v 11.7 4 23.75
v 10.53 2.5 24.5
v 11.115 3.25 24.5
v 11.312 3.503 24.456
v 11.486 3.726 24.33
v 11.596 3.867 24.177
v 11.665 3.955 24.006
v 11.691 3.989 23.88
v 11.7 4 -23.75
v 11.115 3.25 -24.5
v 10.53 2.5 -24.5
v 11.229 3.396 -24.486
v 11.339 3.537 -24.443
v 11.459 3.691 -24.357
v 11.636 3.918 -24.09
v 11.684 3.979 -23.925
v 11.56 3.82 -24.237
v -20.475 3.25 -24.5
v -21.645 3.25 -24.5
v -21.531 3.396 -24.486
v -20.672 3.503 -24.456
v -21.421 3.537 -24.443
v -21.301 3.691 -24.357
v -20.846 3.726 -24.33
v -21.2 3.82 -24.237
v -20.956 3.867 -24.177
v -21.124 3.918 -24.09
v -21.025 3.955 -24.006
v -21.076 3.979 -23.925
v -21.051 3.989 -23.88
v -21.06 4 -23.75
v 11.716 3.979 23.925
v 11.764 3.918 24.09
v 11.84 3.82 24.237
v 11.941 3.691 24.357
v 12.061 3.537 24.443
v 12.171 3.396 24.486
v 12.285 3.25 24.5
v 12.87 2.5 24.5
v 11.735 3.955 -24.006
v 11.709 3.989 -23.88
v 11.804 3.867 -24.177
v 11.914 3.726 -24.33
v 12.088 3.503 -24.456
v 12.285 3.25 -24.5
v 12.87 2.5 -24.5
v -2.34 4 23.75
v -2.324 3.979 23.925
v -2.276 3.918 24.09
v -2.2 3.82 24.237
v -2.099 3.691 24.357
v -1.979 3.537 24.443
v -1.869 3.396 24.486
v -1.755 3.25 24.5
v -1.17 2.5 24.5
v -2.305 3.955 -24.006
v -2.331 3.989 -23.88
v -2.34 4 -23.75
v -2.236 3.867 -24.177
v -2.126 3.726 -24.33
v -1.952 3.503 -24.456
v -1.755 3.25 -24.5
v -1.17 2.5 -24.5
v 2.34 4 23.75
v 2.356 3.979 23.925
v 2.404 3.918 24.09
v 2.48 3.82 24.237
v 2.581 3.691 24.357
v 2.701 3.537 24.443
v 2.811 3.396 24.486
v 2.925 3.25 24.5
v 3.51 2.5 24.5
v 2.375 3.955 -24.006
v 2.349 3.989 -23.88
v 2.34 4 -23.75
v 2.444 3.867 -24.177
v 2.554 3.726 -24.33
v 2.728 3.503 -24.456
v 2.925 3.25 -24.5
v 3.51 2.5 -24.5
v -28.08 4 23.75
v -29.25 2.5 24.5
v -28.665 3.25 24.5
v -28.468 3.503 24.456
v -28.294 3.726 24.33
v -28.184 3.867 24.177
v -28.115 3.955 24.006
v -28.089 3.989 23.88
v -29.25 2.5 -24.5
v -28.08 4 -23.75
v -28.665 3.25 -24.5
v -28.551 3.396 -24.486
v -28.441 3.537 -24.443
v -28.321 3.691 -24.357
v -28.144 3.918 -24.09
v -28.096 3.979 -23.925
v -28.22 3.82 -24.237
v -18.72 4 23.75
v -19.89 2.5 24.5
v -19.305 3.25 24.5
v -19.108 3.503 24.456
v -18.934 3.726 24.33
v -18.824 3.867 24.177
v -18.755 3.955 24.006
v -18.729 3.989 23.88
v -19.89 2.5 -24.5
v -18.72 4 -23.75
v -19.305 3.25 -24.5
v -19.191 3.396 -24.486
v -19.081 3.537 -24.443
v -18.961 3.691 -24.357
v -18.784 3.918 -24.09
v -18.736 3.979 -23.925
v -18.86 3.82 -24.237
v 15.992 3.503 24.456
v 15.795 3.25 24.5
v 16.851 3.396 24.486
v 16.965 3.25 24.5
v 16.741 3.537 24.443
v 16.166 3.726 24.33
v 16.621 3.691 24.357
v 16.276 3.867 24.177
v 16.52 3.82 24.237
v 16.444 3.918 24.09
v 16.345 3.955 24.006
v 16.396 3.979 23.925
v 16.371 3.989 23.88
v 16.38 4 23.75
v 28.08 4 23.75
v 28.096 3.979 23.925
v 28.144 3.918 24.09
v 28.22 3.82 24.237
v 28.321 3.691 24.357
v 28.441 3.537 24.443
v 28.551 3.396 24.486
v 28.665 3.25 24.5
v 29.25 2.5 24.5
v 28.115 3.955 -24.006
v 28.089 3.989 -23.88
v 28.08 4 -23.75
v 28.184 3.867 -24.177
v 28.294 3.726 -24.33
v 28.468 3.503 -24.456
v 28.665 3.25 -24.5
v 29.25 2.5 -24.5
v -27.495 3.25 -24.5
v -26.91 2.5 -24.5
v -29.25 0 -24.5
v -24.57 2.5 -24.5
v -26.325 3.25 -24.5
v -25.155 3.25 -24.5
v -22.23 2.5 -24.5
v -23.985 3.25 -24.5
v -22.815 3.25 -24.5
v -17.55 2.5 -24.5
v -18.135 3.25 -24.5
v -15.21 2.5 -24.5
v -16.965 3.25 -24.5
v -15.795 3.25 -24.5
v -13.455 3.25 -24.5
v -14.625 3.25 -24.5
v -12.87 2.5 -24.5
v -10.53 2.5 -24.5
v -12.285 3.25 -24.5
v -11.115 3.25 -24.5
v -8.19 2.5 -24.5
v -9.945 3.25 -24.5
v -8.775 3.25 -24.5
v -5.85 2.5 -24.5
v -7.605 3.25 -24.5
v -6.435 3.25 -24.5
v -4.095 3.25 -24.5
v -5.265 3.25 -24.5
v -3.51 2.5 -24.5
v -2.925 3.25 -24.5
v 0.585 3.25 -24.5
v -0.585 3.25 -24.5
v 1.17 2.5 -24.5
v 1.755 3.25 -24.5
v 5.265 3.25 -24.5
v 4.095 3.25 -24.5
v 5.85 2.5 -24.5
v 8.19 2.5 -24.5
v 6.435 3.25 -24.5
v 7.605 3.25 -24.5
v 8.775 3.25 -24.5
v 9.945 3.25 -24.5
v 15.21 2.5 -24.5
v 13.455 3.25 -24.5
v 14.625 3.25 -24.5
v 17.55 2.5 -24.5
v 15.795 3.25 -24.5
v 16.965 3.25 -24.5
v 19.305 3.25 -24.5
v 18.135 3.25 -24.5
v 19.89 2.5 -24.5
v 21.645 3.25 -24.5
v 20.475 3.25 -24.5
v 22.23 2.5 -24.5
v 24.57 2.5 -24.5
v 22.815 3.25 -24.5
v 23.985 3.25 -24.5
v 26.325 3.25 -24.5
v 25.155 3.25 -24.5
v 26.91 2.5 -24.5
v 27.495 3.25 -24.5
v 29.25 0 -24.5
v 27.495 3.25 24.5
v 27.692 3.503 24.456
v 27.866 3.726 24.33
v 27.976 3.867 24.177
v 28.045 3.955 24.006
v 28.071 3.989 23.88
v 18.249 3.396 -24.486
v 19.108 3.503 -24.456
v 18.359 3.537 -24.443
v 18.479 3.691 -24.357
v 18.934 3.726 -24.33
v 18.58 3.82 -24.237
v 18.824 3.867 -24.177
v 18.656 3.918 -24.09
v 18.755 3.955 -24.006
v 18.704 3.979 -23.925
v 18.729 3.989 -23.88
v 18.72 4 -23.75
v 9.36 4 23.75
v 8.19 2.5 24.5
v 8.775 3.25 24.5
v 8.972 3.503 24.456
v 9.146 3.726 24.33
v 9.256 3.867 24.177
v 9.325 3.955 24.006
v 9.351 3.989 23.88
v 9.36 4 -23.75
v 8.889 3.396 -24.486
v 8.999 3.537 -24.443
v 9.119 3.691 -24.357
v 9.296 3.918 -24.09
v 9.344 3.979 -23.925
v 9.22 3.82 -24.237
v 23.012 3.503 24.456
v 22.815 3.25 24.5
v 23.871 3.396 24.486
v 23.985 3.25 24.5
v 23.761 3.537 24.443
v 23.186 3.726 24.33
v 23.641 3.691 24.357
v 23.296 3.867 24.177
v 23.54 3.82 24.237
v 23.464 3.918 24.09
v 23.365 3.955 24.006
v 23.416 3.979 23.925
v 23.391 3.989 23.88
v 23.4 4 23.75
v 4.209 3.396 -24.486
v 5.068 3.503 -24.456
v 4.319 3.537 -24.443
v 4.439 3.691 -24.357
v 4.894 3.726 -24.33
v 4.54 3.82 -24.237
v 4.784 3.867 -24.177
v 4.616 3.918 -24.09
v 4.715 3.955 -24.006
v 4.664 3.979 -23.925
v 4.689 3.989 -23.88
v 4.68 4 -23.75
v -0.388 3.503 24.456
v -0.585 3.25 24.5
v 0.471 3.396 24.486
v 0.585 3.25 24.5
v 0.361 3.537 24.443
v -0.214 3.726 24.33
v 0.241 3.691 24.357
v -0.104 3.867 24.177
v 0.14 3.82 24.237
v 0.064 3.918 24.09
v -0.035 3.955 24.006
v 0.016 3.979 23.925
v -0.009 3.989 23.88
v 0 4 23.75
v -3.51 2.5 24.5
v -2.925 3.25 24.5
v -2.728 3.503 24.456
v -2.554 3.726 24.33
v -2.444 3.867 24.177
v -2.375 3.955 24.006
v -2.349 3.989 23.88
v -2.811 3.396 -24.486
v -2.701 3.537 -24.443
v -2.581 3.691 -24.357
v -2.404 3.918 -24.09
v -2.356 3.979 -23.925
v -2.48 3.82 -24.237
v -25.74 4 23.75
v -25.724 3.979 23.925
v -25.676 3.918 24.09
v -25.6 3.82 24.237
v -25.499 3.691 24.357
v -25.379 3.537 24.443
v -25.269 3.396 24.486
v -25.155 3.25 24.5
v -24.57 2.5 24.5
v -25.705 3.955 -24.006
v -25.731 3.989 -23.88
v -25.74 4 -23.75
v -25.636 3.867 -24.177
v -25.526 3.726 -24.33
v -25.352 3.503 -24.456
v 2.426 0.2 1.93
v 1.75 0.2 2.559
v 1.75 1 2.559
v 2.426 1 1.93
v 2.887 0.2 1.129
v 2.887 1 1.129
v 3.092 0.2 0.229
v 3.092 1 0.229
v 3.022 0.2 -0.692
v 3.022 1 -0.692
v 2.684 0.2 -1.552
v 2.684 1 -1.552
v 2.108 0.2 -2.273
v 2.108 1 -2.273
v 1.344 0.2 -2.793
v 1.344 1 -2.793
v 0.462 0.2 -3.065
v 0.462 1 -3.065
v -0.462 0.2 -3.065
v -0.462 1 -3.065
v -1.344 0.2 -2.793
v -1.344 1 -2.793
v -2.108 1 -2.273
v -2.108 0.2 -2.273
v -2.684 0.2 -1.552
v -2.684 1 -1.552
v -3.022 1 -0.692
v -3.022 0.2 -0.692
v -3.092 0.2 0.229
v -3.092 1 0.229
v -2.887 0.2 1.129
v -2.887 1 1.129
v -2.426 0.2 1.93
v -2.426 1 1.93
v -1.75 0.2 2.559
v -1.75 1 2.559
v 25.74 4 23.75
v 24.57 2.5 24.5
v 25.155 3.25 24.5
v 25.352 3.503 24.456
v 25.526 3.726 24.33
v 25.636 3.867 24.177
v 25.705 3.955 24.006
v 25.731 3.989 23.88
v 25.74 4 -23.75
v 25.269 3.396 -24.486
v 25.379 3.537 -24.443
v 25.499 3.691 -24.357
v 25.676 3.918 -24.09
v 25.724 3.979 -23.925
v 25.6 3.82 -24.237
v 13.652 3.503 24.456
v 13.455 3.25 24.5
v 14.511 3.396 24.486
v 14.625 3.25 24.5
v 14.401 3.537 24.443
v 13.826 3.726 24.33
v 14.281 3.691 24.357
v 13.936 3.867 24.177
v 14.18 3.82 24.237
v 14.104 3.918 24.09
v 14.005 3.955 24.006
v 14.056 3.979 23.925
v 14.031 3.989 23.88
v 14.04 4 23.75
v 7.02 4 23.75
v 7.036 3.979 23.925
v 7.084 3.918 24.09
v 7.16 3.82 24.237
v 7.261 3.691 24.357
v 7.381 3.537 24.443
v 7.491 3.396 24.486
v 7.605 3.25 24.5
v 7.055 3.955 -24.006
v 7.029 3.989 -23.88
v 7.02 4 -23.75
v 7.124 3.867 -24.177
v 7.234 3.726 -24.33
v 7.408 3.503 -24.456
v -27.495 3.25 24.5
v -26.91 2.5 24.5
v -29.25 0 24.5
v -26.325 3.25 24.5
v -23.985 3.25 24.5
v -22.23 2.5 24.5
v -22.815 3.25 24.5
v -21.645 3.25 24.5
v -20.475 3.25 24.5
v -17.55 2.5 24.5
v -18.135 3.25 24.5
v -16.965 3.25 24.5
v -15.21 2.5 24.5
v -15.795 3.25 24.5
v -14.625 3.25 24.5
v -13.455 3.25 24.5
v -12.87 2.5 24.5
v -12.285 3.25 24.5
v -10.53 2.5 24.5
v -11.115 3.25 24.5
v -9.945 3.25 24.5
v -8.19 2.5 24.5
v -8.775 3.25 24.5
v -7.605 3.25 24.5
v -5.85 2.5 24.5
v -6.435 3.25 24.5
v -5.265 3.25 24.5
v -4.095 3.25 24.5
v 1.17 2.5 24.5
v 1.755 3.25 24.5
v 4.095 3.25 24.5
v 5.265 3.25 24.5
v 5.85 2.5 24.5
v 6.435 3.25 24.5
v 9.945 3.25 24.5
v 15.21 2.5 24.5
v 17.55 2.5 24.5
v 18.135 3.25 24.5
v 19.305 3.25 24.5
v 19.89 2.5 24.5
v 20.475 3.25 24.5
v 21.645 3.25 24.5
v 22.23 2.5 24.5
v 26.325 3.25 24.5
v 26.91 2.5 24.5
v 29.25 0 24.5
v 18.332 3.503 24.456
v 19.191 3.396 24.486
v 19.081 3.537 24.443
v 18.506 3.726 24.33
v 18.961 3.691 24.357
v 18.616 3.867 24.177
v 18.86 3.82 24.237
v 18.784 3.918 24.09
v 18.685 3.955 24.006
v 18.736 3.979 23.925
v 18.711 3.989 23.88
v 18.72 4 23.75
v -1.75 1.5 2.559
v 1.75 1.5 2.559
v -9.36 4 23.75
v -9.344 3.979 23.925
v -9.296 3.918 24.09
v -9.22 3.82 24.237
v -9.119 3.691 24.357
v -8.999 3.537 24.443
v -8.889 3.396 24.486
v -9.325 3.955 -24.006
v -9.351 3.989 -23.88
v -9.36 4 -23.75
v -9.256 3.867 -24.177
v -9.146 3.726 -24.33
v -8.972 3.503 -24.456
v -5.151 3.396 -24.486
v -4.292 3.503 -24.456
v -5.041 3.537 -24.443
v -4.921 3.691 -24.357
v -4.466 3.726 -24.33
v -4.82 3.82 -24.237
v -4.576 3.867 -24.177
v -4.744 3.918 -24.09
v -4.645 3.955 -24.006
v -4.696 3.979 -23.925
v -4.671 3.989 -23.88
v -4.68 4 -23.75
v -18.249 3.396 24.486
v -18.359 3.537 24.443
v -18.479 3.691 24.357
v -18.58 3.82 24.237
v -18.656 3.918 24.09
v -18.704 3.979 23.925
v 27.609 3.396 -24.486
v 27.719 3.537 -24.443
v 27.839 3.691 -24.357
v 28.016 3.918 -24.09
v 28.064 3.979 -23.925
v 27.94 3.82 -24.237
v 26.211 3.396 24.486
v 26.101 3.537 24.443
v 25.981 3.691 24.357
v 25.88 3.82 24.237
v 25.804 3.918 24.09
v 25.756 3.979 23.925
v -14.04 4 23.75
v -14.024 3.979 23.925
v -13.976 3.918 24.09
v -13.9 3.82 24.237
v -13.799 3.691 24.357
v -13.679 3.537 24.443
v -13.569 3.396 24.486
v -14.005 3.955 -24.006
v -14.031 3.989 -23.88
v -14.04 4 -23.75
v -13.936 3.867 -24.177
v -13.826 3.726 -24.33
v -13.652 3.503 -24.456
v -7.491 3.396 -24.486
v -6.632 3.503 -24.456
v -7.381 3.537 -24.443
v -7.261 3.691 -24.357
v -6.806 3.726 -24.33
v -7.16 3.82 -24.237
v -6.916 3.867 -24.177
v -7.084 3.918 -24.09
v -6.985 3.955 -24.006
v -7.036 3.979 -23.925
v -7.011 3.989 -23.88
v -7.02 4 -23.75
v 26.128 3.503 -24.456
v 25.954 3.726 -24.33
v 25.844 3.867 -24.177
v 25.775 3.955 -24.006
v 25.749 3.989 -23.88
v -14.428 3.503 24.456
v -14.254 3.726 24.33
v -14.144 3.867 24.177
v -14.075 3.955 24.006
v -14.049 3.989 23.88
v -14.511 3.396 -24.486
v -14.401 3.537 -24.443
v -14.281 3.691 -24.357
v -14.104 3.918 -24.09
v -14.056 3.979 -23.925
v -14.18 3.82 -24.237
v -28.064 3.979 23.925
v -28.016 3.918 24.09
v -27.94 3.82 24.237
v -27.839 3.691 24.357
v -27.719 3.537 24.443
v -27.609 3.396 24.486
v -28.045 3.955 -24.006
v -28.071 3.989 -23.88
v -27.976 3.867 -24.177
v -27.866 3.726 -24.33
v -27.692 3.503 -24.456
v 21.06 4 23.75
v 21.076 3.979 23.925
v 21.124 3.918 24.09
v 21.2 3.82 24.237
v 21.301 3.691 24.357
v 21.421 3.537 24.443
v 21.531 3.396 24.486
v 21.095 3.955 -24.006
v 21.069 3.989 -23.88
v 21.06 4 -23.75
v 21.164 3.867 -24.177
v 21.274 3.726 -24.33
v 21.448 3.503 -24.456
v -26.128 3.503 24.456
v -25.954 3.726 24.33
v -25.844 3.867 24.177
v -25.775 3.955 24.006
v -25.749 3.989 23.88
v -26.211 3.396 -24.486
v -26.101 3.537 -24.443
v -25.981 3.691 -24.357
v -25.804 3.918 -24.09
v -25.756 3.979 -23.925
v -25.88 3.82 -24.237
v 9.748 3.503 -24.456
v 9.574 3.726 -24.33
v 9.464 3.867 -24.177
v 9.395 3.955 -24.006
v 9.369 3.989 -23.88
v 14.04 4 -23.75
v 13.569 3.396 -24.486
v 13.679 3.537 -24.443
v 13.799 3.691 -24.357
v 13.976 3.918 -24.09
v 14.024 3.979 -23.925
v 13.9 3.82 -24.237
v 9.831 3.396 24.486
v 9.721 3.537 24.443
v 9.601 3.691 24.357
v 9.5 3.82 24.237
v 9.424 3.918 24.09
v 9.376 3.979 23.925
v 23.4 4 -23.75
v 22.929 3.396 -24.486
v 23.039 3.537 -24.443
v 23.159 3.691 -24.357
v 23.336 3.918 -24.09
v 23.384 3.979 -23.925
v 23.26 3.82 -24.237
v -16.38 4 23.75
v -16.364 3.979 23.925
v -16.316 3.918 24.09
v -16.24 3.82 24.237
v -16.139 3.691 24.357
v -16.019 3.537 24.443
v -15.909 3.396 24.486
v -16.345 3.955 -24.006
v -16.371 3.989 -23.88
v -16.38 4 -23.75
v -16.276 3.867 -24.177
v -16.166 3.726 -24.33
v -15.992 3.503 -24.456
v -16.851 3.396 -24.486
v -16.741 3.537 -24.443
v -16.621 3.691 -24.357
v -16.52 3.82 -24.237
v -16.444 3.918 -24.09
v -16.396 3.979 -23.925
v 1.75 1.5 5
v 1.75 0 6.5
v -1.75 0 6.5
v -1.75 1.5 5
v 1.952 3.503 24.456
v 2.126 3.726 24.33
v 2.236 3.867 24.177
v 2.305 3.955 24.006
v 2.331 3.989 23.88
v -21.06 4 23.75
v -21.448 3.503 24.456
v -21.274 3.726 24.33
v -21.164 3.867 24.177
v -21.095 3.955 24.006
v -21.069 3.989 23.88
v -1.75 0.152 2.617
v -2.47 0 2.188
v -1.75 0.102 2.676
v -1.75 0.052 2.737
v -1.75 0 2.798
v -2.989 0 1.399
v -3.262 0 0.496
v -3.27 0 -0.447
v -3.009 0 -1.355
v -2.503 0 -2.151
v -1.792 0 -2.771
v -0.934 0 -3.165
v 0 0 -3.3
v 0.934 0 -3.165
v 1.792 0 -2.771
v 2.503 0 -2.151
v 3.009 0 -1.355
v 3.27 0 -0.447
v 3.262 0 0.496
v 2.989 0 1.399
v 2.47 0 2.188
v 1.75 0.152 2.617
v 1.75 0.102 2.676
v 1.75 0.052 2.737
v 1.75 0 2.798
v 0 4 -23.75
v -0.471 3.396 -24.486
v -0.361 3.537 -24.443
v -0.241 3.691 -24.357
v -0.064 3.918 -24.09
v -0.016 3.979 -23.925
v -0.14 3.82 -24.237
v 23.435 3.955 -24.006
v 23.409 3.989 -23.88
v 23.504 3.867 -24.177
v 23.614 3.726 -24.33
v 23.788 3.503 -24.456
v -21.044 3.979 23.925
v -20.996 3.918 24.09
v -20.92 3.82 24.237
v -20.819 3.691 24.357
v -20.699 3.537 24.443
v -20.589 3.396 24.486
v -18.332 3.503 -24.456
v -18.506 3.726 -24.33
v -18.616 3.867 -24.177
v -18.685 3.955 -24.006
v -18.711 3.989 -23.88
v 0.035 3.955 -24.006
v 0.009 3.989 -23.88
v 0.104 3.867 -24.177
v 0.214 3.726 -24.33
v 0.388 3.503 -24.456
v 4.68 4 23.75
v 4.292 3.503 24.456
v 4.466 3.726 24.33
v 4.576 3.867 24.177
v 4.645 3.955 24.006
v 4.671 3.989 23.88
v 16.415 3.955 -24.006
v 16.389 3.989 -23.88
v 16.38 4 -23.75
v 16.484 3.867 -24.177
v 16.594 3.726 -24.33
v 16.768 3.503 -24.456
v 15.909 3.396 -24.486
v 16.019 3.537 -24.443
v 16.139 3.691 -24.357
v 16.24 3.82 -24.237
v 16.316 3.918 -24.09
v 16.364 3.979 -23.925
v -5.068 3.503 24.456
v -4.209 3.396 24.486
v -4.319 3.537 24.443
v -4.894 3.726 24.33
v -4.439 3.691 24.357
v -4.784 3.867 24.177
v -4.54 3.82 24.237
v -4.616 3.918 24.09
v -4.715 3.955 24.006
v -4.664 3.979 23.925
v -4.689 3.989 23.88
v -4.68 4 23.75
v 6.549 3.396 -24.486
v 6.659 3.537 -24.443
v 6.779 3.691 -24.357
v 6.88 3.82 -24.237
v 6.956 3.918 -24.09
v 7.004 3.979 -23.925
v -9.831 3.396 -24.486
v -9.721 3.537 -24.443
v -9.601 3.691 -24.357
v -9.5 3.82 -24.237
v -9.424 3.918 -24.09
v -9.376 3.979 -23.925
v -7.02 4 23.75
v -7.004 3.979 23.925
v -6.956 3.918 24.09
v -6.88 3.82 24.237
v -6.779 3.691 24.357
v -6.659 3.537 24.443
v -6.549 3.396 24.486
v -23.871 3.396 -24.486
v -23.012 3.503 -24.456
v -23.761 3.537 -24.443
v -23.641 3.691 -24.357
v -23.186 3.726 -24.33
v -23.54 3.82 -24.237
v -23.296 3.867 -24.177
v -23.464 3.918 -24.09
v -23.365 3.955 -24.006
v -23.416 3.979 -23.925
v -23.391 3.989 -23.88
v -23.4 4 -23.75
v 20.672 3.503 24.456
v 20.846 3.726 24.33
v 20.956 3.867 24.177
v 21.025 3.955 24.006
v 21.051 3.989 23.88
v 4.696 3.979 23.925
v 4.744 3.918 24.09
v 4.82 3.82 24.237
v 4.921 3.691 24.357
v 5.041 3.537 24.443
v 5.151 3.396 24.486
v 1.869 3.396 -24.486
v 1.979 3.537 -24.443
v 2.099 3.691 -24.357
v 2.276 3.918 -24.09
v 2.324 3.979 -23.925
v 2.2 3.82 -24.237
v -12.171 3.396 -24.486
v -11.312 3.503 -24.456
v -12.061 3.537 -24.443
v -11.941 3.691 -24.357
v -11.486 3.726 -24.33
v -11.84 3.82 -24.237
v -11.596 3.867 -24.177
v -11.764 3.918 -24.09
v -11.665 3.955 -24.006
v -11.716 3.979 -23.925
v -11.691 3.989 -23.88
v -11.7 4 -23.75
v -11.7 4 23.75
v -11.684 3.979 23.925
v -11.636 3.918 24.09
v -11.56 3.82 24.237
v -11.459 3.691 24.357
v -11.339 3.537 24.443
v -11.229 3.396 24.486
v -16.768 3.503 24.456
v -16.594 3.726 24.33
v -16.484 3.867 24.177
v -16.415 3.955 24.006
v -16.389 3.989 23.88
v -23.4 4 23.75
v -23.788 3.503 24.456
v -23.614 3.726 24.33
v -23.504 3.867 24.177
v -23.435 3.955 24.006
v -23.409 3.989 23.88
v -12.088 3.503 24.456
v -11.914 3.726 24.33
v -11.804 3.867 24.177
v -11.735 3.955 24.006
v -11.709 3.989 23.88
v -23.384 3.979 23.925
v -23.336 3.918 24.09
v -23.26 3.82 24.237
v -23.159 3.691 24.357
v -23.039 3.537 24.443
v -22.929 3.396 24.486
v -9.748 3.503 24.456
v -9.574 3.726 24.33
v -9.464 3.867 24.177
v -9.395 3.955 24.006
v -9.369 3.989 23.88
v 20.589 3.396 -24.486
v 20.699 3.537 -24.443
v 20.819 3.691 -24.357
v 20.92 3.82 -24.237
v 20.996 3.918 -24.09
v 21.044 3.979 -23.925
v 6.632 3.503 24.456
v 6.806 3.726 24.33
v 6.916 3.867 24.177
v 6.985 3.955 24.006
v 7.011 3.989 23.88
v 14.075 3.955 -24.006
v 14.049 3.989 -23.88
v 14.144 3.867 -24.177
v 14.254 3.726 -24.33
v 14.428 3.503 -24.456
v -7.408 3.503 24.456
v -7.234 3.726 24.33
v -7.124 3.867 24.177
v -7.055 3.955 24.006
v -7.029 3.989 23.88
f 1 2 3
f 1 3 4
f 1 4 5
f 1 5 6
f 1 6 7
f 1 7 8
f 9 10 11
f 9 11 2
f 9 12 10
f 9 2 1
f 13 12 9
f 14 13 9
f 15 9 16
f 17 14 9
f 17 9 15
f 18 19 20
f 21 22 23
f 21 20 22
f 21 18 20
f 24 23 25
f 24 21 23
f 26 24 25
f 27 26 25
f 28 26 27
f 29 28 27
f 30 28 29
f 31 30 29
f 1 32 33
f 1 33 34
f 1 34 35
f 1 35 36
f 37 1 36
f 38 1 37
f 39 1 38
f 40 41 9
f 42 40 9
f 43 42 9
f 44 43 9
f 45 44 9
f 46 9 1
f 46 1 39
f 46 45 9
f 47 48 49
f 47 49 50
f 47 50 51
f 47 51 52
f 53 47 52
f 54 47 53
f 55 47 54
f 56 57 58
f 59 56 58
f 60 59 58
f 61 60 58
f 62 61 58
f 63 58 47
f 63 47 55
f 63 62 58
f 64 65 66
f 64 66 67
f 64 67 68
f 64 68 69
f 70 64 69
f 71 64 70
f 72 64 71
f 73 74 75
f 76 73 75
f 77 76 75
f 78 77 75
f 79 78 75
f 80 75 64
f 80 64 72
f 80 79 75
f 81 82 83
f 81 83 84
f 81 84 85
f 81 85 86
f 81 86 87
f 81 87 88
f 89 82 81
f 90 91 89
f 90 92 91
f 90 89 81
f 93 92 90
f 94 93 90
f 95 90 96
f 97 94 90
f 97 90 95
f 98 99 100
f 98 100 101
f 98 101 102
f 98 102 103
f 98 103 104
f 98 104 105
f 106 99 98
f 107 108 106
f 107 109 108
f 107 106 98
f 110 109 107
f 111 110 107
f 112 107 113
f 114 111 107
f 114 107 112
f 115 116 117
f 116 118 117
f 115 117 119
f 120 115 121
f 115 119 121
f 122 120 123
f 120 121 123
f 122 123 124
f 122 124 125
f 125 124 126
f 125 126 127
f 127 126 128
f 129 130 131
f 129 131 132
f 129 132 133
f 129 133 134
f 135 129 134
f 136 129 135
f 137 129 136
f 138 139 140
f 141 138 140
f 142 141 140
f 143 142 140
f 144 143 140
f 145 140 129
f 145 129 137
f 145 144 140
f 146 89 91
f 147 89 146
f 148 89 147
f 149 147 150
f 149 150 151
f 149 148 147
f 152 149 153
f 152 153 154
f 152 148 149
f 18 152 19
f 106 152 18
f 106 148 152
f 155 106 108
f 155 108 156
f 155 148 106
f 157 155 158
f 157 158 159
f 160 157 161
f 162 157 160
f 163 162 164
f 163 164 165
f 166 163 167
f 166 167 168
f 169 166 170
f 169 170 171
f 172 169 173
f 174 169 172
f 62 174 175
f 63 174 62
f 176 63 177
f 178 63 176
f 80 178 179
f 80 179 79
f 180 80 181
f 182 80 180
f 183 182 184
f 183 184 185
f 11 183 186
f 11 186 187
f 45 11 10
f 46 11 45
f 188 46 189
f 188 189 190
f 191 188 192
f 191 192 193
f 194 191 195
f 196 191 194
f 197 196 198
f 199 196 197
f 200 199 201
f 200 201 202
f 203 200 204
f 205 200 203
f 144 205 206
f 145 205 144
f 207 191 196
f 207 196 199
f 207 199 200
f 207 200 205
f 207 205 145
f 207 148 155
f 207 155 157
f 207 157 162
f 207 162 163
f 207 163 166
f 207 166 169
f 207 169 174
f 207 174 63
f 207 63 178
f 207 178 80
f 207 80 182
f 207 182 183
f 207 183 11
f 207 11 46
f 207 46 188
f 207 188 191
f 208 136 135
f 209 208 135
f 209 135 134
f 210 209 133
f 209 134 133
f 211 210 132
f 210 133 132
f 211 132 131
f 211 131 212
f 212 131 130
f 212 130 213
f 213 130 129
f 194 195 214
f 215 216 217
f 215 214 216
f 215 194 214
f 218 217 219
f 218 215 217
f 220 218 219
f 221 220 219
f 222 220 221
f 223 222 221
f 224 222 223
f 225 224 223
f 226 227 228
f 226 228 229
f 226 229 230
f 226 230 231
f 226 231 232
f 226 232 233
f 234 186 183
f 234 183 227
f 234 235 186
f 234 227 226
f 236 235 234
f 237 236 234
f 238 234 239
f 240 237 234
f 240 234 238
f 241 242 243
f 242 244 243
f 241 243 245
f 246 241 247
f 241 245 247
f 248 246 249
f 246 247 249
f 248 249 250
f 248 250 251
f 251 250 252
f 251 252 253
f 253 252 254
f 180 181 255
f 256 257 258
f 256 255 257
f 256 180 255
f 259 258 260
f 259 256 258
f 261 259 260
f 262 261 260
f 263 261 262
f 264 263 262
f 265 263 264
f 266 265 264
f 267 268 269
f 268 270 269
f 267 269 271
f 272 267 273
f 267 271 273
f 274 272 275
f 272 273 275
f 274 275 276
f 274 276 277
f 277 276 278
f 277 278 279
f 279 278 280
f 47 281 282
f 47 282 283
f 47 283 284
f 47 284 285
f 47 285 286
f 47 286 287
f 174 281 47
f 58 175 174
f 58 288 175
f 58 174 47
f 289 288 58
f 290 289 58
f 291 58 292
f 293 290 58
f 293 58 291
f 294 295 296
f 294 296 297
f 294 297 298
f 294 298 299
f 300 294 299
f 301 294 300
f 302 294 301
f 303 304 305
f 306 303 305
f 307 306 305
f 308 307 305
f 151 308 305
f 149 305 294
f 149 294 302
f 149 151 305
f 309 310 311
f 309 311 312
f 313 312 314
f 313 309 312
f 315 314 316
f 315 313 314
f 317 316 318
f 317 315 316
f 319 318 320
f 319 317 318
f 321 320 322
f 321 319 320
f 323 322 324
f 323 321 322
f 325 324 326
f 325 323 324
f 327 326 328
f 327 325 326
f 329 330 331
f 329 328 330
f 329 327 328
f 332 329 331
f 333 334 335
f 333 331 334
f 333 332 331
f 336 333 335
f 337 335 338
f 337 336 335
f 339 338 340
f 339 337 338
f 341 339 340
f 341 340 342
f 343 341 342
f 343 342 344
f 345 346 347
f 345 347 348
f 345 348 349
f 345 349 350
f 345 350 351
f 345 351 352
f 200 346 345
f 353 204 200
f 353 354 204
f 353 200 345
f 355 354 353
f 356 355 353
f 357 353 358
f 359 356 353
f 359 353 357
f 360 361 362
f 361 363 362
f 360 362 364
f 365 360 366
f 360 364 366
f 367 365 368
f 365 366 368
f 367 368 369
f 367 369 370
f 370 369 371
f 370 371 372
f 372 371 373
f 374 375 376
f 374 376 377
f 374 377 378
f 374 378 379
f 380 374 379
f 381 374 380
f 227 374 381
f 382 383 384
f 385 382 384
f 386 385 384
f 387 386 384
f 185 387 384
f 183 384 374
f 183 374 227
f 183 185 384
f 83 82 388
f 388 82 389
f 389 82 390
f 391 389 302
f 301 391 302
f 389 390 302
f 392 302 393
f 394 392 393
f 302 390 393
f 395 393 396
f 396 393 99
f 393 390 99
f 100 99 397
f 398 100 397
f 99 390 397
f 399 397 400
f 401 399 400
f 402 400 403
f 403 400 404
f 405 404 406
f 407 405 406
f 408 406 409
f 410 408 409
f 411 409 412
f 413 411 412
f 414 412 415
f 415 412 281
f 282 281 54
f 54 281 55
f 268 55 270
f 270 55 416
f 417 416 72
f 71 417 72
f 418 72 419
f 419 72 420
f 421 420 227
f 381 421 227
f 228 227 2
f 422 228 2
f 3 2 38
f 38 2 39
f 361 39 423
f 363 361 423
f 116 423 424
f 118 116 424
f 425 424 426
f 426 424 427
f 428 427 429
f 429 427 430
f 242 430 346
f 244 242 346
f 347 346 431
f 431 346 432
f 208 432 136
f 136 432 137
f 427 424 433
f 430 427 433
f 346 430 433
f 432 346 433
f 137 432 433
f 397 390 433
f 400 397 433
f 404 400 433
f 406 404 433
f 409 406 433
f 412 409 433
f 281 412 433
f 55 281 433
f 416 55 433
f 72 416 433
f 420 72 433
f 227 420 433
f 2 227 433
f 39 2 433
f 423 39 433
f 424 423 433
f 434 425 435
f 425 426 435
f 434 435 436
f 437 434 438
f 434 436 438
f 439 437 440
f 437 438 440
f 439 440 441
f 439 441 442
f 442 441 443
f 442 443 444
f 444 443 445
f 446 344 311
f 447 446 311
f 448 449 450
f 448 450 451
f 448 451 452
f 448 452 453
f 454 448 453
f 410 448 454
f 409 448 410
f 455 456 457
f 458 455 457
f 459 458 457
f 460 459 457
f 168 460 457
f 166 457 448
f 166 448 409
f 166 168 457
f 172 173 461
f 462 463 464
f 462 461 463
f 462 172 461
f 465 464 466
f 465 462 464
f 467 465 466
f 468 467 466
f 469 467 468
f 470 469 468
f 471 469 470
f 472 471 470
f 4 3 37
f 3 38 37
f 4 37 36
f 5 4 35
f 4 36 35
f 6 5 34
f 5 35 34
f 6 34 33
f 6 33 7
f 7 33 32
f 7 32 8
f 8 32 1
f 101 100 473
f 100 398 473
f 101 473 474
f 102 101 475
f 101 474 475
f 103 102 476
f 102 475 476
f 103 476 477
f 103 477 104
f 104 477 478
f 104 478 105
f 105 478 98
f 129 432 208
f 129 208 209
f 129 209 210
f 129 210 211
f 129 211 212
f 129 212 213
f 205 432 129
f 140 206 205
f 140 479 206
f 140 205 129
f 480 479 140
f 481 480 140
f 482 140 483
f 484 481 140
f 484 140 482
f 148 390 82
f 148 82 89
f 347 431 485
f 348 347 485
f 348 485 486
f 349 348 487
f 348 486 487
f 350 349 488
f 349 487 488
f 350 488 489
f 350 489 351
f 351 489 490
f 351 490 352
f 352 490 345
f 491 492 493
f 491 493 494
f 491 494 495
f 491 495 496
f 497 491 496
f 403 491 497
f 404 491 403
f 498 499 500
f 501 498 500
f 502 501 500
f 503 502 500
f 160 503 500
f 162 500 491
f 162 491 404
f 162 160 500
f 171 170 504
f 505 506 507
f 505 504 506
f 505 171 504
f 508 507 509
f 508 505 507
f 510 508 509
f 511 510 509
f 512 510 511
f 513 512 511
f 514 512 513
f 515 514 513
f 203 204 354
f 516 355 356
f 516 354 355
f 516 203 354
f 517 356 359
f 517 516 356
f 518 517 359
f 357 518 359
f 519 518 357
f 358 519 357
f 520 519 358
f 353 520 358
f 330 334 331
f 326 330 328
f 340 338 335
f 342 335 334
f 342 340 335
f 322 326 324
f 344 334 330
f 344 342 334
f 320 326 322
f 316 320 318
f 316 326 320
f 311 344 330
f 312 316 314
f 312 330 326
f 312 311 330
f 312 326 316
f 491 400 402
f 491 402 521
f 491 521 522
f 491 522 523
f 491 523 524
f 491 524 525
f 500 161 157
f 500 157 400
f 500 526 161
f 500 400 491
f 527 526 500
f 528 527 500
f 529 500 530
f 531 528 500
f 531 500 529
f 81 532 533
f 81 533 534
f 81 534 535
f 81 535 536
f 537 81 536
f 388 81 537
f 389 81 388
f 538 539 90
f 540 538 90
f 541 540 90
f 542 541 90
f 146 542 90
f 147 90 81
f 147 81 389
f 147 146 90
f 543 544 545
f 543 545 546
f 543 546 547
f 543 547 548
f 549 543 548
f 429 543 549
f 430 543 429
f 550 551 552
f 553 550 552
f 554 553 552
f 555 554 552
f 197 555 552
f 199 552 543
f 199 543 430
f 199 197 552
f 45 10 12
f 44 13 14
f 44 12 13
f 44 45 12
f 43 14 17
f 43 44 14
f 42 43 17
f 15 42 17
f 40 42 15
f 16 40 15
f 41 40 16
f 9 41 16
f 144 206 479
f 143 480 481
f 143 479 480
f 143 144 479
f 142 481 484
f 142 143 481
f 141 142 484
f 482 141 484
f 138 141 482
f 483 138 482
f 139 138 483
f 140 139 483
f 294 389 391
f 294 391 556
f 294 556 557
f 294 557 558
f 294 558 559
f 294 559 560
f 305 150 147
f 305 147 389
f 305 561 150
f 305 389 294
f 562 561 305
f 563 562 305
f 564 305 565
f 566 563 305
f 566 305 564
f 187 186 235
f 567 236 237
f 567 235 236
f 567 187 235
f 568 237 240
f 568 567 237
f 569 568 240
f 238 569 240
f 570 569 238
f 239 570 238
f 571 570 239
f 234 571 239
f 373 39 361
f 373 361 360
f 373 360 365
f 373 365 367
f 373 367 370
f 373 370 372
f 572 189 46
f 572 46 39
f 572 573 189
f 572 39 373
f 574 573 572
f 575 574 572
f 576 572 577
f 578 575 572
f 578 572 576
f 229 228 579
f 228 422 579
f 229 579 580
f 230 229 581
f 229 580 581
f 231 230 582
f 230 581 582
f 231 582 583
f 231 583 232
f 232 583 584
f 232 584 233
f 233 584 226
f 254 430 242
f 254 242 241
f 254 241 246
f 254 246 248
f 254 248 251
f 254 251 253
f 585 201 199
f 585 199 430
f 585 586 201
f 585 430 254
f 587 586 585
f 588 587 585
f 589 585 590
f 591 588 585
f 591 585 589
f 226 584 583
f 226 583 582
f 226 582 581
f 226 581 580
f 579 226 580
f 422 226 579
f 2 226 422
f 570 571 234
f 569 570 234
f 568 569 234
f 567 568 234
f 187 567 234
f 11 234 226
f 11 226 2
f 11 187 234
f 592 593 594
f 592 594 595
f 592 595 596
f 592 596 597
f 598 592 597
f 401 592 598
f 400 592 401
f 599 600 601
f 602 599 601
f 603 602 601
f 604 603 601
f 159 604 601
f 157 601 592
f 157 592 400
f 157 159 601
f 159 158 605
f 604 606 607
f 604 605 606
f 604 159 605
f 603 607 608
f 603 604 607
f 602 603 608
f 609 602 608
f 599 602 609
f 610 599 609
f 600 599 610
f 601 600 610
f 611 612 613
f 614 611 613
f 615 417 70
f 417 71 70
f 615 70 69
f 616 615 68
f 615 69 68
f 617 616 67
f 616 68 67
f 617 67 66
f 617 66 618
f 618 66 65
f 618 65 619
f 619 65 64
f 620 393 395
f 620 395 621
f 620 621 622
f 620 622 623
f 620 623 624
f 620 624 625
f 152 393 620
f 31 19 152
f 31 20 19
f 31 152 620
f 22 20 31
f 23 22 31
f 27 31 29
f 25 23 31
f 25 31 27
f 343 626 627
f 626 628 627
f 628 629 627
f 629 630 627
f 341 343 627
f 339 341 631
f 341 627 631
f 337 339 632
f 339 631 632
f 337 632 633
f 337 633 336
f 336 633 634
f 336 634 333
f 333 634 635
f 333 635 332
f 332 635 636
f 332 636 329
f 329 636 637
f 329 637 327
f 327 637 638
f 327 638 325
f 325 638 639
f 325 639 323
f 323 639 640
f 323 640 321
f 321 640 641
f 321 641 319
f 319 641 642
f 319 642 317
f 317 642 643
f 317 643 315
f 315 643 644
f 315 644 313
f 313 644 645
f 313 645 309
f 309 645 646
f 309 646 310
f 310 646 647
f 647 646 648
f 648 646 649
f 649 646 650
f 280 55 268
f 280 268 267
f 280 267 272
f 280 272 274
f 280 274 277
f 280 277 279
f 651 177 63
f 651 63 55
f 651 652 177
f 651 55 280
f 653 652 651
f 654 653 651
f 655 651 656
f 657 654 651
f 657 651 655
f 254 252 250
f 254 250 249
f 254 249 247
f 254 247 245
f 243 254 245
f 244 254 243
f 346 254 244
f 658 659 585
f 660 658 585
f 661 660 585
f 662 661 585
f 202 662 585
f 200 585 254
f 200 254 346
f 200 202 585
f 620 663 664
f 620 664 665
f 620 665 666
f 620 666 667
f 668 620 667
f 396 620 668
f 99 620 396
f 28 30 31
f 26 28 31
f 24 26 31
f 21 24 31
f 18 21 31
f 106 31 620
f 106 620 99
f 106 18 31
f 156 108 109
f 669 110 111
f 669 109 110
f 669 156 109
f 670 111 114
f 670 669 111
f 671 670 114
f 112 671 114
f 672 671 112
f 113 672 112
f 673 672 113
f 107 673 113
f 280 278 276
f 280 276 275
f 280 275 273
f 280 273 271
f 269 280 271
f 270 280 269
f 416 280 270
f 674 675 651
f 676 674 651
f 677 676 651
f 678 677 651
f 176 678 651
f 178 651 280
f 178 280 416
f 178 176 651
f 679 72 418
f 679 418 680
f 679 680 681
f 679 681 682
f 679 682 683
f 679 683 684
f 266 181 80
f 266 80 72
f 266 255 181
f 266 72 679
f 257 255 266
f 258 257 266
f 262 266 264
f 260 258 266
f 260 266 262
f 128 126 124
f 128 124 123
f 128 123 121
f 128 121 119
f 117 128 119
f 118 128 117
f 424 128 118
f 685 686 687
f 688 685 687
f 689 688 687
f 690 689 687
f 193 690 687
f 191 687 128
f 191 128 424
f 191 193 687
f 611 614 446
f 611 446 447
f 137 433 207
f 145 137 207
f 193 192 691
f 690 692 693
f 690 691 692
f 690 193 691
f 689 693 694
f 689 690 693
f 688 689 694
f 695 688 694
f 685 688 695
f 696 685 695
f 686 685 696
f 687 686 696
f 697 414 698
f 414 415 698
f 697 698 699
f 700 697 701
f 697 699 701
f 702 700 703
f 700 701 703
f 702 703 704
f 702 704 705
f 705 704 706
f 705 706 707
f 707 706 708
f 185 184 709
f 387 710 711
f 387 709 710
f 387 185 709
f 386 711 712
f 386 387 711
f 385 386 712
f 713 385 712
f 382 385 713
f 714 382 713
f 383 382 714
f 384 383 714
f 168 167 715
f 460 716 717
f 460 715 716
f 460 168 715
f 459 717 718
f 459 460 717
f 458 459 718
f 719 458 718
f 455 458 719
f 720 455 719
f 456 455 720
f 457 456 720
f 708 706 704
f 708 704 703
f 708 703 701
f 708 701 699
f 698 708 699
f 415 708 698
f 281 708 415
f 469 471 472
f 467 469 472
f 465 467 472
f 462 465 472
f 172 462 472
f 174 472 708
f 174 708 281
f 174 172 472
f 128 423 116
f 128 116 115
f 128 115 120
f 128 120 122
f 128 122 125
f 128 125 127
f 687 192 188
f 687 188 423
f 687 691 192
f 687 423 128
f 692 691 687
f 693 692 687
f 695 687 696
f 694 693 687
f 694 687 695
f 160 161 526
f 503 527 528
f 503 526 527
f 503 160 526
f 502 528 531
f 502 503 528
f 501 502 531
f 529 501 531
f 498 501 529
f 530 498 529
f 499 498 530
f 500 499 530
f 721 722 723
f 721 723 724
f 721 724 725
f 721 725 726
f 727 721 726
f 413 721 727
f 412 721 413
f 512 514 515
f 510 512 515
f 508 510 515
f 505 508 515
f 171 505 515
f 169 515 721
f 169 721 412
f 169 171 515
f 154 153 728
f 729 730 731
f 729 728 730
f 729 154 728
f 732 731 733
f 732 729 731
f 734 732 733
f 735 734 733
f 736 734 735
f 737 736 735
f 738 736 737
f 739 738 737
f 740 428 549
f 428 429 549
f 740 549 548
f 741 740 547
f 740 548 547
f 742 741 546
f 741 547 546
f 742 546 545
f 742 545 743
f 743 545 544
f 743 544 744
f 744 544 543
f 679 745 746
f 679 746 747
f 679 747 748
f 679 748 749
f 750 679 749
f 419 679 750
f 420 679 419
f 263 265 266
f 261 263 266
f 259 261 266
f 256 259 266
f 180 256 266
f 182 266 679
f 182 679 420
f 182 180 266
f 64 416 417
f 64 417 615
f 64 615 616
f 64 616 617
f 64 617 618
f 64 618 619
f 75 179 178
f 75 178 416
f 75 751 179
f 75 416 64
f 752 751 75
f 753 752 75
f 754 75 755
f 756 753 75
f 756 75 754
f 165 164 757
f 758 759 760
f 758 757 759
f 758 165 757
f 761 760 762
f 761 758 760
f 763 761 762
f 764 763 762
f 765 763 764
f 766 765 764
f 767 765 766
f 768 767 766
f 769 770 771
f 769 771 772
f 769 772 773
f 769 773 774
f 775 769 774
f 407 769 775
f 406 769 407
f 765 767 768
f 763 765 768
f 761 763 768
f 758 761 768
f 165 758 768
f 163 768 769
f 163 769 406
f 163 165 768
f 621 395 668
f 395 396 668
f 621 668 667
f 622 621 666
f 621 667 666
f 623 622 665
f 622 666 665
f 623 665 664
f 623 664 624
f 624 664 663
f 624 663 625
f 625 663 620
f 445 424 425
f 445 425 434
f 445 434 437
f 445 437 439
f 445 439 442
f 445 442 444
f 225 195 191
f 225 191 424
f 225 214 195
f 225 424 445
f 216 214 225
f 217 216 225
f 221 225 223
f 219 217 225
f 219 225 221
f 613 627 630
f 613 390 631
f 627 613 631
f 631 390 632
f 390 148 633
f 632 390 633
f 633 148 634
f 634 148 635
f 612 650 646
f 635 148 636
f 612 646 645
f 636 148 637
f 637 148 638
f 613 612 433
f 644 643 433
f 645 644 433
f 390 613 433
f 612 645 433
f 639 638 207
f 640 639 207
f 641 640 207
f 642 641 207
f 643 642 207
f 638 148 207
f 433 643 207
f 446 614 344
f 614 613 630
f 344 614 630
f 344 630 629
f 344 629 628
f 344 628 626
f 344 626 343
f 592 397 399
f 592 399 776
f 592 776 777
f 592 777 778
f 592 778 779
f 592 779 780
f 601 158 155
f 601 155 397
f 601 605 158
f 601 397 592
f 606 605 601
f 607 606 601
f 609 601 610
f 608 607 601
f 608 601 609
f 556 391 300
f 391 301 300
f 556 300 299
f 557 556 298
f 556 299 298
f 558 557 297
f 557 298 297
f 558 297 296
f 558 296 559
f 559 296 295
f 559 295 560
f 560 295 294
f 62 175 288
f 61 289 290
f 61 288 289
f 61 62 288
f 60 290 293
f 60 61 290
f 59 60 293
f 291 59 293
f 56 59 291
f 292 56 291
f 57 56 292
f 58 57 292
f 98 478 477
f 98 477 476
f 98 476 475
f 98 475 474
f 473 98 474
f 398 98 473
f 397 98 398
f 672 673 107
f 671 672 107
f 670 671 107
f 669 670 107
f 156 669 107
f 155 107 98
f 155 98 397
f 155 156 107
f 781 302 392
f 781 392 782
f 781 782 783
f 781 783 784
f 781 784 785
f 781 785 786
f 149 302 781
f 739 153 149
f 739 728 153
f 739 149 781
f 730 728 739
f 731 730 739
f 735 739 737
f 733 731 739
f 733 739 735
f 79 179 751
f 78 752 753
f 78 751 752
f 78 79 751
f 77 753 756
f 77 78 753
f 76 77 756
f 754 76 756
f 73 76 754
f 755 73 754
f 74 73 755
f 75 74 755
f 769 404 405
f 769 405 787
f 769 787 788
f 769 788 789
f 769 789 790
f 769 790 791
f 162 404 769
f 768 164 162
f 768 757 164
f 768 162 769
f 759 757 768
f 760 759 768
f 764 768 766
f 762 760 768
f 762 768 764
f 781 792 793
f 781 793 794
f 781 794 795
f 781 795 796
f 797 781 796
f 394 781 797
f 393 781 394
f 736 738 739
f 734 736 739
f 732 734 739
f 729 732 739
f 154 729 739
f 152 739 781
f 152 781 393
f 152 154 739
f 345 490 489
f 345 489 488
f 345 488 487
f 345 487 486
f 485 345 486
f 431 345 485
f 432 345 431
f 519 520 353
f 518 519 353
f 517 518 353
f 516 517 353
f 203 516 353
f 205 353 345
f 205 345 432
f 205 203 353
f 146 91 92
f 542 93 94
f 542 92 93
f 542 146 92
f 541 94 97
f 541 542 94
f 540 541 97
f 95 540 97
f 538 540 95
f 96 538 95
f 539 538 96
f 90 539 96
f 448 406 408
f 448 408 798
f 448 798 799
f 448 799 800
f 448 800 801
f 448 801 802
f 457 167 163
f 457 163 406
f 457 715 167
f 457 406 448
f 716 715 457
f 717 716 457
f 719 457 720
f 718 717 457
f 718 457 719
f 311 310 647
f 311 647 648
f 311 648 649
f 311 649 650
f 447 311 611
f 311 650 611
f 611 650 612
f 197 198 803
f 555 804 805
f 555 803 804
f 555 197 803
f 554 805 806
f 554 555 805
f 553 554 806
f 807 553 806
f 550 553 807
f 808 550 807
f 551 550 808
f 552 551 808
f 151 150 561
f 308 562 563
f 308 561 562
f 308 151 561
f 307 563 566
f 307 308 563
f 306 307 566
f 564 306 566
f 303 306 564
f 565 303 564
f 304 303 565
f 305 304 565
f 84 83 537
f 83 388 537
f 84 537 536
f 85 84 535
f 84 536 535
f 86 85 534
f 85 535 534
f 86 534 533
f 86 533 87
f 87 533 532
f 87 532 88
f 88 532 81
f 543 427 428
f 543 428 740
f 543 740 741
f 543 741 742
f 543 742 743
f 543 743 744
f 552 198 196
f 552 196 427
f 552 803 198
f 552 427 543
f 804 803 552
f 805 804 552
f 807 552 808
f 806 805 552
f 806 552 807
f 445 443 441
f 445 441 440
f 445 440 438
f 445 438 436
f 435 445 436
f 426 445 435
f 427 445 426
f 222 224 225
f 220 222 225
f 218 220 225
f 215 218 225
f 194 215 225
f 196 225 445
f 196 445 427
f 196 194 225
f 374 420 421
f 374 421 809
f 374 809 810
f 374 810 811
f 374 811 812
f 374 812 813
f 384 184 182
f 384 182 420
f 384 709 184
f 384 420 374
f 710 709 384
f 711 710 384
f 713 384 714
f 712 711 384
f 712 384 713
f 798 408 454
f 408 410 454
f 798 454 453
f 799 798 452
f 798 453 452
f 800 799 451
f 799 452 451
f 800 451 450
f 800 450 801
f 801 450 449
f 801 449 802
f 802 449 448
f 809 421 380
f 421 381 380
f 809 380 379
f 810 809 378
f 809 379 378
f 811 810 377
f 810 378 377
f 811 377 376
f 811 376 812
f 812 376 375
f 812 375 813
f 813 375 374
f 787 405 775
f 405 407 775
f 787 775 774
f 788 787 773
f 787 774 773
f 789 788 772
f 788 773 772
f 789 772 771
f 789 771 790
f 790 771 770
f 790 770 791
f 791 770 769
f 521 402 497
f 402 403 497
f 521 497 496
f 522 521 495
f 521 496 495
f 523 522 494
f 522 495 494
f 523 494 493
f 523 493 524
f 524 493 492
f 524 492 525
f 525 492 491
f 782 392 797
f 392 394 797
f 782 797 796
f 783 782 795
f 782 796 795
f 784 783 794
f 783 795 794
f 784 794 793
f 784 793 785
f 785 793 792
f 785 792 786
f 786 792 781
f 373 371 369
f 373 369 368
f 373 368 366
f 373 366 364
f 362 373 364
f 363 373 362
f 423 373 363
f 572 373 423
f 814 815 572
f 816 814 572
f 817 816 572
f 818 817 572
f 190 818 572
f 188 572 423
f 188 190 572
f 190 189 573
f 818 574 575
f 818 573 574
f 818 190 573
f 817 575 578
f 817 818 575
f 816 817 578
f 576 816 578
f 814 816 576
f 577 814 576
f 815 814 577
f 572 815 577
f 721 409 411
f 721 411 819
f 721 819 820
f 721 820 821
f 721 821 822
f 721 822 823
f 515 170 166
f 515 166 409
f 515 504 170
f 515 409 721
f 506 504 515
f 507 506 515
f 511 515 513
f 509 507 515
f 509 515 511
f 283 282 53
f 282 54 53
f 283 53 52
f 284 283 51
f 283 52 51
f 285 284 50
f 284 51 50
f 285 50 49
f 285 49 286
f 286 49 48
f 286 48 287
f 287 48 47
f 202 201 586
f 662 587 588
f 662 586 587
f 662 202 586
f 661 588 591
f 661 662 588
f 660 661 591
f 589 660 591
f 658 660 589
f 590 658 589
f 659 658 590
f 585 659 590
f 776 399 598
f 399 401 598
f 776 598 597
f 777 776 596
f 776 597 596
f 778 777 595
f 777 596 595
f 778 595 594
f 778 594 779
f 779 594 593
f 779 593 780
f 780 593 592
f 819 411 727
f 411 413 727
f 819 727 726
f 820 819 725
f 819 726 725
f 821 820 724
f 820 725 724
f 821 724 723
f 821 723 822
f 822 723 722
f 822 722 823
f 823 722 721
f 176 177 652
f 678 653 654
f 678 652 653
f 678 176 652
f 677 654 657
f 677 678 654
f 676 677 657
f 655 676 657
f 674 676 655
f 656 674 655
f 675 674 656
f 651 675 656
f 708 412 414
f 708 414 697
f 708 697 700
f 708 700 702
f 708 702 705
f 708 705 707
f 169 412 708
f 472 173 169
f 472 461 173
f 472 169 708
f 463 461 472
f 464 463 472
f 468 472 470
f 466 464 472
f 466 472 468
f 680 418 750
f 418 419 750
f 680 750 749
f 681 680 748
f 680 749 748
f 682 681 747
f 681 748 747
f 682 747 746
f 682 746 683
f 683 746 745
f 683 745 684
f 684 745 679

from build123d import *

# Parameters (mm, degrees)
SKETCH1_W           = 58.5
SKETCH1_H           = 49
SKETCH1_R           = 3.1
BOSS_EXTRUDE1_DEPTH = 1.5
BOSS_EXTRUDE2_DEPTH = 49
CUT_EXTRUDE1_DEPTH  = 1
CHAMFER2_SIZE       = 0.2
CUT_EXTRUDE3_DEPTH  = 64.549193543
BOSS_EXTRUDE3_START = 0.5
SKETCH5_R           = 3.1
BOSS_EXTRUDE3_DEPTH = 0.5
SKETCH6_W           = 3.5
SKETCH6_H           = 2.441191684
CUT_EXTRUDE4_DEPTH  = 0.5
CHAMFER3_SIZE       = 1.5


with BuildPart() as part:
    # Sketch1 → Boss-Extrude1 (new body)
    with BuildSketch(Plane(origin=(0, 0, 0), x_dir=(1, 0, 0), z_dir=(0, 1, 0))):
        Rectangle(SKETCH1_W, SKETCH1_H)
        with Locations(Location((0, 0, 0), (0, 0, 270))):
            Circle(SKETCH1_R, mode=Mode.SUBTRACT)
    extrude(amount=BOSS_EXTRUDE1_DEPTH)

    # Sketch2 → Boss-Extrude2 (add)
    with BuildSketch(Plane(origin=(0, 0, -24.5), x_dir=(-1, 0, 0), z_dir=(0, 0, -1))):
        Polygon((-29.25, 1.5), (29.25, 1.5), (29.25, 2.5), (28.08, 4), (26.91, 2.5), (25.74, 4), (24.57, 2.5), (23.4, 4), (22.23, 2.5), (21.06, 4), (19.89, 2.5), (18.72, 4), (17.55, 2.5), (16.38, 4), (15.21, 2.5), (14.04, 4), (12.87, 2.5), (11.7, 4), (10.53, 2.5), (9.36, 4), (8.19, 2.5), (7.02, 4), (5.85, 2.5), (4.68, 4), (3.51, 2.5), (2.34, 4), (1.17, 2.5), (0, 4), (-1.17, 2.5), (-2.34, 4), (-3.51, 2.5), (-4.68, 4), (-5.85, 2.5), (-7.02, 4), (-8.19, 2.5), (-9.36, 4), (-10.53, 2.5), (-11.7, 4), (-12.87, 2.5), (-14.04, 4), (-15.21, 2.5), (-16.38, 4), (-17.55, 2.5), (-18.72, 4), (-19.89, 2.5), (-21.06, 4), (-22.23, 2.5), (-23.4, 4), (-24.57, 2.5), (-25.74, 4), (-26.91, 2.5), (-28.08, 4), (-29.25, 2.5), align=None)
    extrude(amount=-BOSS_EXTRUDE2_DEPTH)

    # Sketch3 → Cut-Extrude1 (cut)
    with BuildSketch(Plane(origin=(0, 0, 0), x_dir=(-1, 0, 0), z_dir=(0, -1, 0))):
        with BuildLine():
            Line((-1.75, -2.558808316), (-1.75, -5))
            Line((-1.75, -5), (1.75, -5))
            Line((1.75, -5), (1.75, -2.558808316))
            ThreePointArc((1.75, -2.558808316), (0, 3.1), (-1.75, -2.558808316))
        make_face()
    extrude(amount=-CUT_EXTRUDE1_DEPTH, mode=Mode.SUBTRACT)

    # Chamfer2
    chamfer2_edges = [part.edges().sort_by_distance(p)[0] for p in [
        (0, 0, -3.1),
    ]]
    chamfer(chamfer2_edges, length=CHAMFER2_SIZE)

    # Sketch4 → Cut-Extrude3 (cut, through all)
    with BuildSketch(Plane(origin=(29.25, 0, 0), x_dir=(0, 0, -1), z_dir=(1, 0, 0))):
        with BuildLine():
            Line((-23.75, 4), (-24.5, 4))
            Line((-24.5, 4), (-24.5, 3.25))
            ThreePointArc((-24.5, 3.25), (-24.280330086, 3.780330086), (-23.75, 4))
        make_face()
    cut_extrude3 = extrude(amount=-CUT_EXTRUDE3_DEPTH, mode=Mode.SUBTRACT)

    # Mirror1: Cut-Extrude3 across plane
    add(cut_extrude3.mirror(Plane.XY), mode=Mode.SUBTRACT)

    # Sketch5 → Boss-Extrude3 (add)
    with BuildSketch(Plane.XZ.offset(-1.5).offset(BOSS_EXTRUDE3_START)):
        Circle(SKETCH5_R)
    extrude(amount=-BOSS_EXTRUDE3_DEPTH)

    # Sketch6 → Cut-Extrude4 (cut)
    with BuildSketch(Plane.XZ.offset(-1)):
        with Locations((0, 3.779404158)):
            Rectangle(SKETCH6_W, SKETCH6_H)
    extrude(amount=-CUT_EXTRUDE4_DEPTH, mode=Mode.SUBTRACT)

    # Chamfer3
    chamfer3_edges = [part.edges().sort_by_distance(p)[0] for p in [
        (0, 0, 5),
    ]]
    chamfer(chamfer3_edges, length=CHAMFER3_SIZE - 0.0001)  # a hair under: the kernel refuses the full size


solid = part.part
